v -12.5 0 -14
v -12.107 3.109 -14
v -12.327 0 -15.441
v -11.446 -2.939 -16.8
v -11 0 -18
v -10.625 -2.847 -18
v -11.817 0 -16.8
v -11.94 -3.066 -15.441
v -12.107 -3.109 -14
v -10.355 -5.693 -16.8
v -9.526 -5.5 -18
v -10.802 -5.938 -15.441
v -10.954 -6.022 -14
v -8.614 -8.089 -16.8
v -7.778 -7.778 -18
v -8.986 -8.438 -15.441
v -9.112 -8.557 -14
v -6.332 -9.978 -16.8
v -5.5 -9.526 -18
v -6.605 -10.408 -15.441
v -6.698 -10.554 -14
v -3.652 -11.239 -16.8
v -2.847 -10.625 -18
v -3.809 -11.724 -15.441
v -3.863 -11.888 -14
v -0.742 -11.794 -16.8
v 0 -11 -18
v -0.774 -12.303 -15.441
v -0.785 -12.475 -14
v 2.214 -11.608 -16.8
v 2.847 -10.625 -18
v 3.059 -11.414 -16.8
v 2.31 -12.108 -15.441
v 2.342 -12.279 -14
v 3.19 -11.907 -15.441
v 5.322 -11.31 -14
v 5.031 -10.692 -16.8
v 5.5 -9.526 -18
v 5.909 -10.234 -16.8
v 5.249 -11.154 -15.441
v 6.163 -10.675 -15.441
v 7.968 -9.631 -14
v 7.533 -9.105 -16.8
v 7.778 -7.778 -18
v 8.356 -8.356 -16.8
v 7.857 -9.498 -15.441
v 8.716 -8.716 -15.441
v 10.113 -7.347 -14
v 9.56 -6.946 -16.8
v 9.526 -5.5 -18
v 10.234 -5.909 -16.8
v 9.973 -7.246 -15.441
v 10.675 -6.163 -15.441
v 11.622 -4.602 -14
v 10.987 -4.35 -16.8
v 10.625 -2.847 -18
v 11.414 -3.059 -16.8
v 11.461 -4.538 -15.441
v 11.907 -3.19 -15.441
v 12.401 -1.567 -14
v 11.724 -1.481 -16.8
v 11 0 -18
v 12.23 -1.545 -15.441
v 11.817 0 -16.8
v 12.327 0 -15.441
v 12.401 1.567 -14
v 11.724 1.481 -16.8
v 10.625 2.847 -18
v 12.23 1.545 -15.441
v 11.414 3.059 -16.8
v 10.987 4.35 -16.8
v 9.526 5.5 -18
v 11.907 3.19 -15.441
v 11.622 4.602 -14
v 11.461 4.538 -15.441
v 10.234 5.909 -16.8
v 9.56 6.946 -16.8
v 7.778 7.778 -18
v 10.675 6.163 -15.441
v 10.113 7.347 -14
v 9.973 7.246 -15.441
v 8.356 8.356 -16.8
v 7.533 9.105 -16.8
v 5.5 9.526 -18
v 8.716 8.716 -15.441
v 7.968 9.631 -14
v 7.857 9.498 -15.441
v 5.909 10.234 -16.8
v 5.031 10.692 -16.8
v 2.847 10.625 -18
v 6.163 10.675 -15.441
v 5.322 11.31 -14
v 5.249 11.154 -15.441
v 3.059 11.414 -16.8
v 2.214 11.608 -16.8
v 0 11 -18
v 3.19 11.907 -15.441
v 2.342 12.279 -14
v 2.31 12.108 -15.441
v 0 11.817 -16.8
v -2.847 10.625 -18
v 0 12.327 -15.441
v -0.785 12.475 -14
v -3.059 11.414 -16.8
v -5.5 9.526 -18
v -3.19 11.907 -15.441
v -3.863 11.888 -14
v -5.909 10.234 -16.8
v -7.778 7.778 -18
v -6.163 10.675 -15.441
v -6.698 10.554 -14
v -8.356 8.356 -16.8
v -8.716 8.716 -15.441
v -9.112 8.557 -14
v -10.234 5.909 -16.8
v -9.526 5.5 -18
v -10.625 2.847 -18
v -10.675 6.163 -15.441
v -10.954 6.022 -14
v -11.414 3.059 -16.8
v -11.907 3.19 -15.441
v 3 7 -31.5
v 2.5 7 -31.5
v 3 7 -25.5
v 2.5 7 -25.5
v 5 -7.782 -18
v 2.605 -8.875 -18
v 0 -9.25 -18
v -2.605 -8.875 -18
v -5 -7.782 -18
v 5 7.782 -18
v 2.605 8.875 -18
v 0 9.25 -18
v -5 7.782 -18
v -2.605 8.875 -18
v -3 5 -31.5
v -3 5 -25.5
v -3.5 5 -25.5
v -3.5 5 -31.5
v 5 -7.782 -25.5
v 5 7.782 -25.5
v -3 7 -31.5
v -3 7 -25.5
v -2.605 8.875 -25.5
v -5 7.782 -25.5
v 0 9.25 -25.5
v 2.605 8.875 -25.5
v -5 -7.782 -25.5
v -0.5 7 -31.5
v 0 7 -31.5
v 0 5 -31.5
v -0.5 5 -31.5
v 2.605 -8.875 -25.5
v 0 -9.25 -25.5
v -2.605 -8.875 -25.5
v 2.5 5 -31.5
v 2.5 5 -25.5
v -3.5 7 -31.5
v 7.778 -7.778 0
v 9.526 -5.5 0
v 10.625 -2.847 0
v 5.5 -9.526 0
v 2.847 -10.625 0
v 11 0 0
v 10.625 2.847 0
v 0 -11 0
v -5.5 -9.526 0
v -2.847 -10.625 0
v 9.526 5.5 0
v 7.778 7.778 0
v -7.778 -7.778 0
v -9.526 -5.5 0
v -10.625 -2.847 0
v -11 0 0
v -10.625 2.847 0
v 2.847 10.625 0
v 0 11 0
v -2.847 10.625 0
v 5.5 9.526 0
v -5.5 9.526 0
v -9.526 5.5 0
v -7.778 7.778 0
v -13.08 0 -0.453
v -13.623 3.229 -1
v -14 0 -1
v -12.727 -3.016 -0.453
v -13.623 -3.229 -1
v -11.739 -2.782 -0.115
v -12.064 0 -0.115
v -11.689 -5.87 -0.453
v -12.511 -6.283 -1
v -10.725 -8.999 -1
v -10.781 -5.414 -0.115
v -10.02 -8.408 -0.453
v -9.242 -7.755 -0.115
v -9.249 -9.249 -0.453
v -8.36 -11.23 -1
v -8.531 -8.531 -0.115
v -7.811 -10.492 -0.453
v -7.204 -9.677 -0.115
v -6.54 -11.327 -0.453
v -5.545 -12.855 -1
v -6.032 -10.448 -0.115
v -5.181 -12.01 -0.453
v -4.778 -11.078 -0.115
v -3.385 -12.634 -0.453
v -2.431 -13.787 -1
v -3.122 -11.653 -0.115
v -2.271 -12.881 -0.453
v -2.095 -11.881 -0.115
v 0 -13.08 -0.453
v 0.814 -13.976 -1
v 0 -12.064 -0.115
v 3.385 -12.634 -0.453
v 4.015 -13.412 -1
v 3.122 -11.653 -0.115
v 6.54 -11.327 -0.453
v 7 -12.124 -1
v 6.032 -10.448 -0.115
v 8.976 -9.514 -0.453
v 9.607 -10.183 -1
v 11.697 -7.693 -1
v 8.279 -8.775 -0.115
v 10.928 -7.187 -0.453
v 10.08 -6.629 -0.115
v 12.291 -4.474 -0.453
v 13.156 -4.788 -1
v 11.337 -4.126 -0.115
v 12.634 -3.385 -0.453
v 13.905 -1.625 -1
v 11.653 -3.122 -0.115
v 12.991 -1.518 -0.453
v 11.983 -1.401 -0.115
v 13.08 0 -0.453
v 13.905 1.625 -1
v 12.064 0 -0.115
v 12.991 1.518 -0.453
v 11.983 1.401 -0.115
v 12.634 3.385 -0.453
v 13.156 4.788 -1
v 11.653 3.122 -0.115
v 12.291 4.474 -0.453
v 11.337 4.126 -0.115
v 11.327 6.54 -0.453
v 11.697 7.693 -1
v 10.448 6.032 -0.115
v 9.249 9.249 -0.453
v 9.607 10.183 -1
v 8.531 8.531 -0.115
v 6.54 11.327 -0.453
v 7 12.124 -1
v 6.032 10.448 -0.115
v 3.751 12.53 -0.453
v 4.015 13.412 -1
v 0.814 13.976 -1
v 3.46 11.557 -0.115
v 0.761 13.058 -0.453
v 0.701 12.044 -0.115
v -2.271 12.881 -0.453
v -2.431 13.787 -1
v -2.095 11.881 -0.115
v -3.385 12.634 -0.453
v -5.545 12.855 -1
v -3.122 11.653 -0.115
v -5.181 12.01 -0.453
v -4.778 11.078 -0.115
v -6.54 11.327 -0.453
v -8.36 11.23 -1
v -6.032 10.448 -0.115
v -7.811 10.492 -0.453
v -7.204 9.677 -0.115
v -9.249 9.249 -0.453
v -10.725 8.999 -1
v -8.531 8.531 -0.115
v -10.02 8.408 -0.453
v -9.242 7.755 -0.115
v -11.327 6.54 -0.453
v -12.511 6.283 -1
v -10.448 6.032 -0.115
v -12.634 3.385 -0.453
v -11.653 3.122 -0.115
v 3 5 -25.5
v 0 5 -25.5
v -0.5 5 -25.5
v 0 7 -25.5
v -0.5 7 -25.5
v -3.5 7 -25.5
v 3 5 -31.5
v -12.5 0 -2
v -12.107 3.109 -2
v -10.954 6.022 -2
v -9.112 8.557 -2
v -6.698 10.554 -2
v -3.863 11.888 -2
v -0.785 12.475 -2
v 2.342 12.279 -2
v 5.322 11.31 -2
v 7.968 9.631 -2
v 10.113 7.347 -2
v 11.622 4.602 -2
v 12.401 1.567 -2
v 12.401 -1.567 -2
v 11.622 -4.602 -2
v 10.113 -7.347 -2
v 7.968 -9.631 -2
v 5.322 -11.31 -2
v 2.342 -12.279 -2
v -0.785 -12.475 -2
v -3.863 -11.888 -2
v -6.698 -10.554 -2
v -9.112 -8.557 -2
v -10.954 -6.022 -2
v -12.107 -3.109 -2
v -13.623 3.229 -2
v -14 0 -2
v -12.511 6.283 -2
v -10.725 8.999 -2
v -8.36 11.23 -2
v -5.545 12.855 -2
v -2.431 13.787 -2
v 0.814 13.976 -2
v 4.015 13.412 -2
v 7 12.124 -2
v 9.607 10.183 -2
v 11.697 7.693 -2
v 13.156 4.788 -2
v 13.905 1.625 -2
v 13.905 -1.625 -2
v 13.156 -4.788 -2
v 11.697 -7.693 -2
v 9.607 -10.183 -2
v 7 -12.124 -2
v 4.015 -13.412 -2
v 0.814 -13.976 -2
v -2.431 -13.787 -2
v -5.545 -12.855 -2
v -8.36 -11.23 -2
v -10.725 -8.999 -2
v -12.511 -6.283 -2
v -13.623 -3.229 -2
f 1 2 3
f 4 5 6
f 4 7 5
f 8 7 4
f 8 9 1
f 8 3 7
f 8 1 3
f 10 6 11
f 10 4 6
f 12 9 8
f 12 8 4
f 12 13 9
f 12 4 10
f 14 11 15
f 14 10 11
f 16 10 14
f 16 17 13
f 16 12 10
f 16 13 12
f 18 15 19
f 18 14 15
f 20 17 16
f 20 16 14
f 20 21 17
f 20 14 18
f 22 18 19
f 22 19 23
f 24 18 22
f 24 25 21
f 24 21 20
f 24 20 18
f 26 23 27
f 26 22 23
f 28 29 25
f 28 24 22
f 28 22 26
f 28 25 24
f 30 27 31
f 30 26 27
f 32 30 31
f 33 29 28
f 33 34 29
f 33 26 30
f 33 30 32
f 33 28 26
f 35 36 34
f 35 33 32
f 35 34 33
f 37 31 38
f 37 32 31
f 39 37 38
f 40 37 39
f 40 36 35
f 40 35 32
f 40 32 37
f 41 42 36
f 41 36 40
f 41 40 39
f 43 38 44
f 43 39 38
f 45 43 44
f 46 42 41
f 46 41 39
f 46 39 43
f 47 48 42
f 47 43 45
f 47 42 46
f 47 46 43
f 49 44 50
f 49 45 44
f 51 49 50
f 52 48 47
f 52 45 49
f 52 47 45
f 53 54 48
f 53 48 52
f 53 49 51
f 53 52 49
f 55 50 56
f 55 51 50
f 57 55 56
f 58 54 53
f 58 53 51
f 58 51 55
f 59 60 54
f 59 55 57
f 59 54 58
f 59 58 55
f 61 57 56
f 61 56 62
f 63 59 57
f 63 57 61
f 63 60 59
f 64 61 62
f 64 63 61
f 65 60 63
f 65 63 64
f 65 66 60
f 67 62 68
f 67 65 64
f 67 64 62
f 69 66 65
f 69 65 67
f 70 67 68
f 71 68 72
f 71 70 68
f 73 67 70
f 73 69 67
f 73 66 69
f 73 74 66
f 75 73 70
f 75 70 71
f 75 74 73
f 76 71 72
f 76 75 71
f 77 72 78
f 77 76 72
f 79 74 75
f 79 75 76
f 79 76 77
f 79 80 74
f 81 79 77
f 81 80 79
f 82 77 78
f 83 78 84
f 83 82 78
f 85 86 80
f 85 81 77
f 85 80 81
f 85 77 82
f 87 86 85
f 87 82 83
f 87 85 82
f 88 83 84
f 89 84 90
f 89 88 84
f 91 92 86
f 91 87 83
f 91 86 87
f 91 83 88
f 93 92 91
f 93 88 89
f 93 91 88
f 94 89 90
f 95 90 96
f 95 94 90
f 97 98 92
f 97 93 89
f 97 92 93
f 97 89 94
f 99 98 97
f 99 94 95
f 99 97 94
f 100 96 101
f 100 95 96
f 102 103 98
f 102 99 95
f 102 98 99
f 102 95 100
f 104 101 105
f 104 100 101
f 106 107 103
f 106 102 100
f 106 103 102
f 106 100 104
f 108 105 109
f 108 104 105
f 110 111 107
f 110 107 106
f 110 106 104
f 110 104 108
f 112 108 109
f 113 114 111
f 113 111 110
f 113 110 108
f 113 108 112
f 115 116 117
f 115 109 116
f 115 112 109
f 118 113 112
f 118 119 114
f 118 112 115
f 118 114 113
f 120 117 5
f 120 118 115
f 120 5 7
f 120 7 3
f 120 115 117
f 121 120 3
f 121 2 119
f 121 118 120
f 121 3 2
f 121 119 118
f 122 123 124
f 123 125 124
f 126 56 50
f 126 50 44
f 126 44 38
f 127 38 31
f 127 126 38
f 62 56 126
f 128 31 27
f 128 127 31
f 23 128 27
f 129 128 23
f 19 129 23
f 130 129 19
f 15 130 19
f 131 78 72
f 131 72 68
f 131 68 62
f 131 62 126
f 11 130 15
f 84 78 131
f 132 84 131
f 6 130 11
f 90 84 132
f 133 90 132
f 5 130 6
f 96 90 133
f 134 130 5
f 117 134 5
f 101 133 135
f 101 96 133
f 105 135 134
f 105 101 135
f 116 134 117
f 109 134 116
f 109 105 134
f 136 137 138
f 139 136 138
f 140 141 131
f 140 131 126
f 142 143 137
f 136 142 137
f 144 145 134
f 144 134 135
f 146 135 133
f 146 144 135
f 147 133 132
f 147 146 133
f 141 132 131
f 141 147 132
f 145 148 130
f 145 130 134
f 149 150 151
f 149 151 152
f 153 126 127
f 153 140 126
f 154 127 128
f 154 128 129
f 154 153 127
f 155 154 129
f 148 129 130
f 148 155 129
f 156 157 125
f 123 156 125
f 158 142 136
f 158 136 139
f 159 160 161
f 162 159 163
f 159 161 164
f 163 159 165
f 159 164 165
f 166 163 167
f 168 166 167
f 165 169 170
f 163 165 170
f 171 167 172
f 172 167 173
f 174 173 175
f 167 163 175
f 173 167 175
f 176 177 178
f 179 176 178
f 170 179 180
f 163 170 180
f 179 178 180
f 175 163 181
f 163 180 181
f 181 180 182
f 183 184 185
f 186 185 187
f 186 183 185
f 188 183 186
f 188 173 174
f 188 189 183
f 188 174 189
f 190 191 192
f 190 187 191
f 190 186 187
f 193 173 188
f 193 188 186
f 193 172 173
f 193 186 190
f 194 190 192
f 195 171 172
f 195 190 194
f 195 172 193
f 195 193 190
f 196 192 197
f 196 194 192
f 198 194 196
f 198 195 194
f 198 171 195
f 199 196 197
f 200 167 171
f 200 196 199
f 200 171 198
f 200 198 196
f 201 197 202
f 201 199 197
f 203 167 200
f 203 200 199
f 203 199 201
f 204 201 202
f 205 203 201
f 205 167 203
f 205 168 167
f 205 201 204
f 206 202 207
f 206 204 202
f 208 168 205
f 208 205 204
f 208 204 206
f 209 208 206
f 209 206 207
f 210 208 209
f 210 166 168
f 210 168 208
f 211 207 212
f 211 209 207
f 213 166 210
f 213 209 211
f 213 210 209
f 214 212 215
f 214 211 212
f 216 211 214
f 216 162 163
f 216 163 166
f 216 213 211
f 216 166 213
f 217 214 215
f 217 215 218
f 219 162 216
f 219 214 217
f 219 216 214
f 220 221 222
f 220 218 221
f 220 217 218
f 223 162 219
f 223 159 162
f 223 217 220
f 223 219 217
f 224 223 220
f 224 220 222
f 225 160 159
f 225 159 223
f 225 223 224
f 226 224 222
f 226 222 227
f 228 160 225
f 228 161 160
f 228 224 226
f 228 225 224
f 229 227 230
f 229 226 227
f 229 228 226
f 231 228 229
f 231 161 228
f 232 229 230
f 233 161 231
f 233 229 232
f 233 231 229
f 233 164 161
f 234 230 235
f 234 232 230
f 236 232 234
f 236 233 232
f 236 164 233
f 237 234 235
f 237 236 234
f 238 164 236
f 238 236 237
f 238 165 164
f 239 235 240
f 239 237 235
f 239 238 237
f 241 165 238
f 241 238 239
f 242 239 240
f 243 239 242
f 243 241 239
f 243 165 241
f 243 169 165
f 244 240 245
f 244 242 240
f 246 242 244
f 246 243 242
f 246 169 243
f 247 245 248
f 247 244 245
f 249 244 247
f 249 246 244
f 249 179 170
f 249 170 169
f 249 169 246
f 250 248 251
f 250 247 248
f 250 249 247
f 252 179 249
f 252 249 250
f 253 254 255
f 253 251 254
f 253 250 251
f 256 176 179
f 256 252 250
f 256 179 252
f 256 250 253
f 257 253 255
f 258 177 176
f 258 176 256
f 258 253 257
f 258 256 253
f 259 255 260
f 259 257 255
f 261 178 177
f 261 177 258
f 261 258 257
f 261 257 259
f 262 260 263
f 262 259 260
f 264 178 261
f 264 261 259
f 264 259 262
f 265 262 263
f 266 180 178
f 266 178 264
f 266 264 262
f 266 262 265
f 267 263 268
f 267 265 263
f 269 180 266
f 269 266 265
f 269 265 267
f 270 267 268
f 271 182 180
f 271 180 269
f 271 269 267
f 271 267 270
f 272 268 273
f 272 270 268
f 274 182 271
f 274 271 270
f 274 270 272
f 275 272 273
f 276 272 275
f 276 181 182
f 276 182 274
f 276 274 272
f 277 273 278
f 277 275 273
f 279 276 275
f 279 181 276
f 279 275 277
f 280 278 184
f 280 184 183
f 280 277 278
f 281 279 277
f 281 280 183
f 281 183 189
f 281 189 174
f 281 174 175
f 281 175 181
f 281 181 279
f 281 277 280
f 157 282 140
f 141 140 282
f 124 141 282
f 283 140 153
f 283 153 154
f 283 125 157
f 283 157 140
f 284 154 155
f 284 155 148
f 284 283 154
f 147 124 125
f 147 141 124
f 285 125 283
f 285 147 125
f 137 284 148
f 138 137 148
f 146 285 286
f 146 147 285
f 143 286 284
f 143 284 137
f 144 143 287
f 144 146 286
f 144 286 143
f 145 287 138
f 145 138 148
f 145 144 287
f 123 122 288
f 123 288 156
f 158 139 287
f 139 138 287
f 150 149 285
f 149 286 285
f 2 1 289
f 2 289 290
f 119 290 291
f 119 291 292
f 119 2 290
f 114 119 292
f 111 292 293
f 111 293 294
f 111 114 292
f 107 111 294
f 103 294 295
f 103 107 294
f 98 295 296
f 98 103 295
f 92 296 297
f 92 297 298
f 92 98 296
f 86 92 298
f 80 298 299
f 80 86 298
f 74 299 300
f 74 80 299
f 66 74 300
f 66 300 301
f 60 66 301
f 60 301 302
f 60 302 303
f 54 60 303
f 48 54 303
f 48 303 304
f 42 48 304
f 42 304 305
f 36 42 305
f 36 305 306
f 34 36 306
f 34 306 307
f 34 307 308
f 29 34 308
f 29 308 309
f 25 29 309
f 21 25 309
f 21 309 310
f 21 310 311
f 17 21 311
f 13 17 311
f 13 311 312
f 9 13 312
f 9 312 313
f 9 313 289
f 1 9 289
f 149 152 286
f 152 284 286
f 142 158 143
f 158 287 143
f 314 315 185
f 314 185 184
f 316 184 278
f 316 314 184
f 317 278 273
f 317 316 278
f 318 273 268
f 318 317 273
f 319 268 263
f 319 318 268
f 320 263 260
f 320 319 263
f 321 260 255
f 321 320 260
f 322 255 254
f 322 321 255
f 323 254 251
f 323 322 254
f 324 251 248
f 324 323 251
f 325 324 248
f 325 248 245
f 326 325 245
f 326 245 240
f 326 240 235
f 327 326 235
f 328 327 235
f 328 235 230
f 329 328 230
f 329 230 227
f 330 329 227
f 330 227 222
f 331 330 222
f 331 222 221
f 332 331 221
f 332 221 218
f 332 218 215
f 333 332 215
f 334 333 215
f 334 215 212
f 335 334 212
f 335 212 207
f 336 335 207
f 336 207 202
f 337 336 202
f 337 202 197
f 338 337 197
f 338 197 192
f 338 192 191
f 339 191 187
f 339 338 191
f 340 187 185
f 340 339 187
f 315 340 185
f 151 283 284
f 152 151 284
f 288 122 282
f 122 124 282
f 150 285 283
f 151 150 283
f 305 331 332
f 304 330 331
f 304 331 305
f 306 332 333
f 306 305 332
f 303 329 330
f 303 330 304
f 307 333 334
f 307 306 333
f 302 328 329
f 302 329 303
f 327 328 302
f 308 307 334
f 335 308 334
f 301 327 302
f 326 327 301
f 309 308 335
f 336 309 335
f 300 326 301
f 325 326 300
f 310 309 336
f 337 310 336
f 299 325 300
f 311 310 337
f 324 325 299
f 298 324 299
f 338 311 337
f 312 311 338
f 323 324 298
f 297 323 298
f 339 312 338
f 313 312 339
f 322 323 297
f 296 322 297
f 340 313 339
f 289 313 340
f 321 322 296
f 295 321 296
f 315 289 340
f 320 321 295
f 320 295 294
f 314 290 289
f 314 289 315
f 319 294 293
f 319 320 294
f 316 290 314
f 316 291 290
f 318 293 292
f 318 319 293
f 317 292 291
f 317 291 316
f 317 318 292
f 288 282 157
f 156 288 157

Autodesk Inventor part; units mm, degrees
ref_plane "YZ Plane" through (0, 0, 0) normal (1, 0, 0) x (0, 1, 0)
ref_plane "XZ Plane" through (0, 0, 0) normal (0, 1, 0) x (-1, 0, 0)
ref_plane "XY Plane" through (0, 0, 0) normal (0, 0, 1) x (1, 0, 0)
sketch "Skizze1" plane through (0, 0, 0) normal (0, 1, 0) x (-1, 0, 0)
  line L0 (0, 0) -> (0, -100) construction
  line L1 (0, 0) -> (11, 0)
  arc A0 (14, -1) -> (11, 0) centre (11, -5) ccw
  line L2 (14, -1) -> (14, -2)
  line L3 (14, -2) -> (12.5, -2)
  line L4 (12.5, -2) -> (12.5, -14)
  arc A1 (11, -18) -> (12.5, -14) centre (6.4167, -14) ccw
  line L5 (11, -18) -> (9.25, -18)
  line L6 (9.25, -18) -> (9.25, -25.5)
  line L7 (9.25, -25.5) -> (0, -25.5)
  line L8 (0, 0) -> (0, -25.5)
  point P0 (13.25, -2)
  dimension "d0" = 100
  dimension "d1" = 25
  dimension "d2" = 28
  dimension "d3" = 2
  dimension "d4" = 1
  dimension "d5" = 3
  dimension "d6" = 12
  dimension "d7" = 4
  dimension "d8" = 22
  dimension "d9" = 18.5
  dimension "d10" = 7.5
revolve "Umdrehung1" add sketch "Skizze1" angle 360 about axis through (0, 0, 0) along (0, 0, -1)
thread "Gewinde1" size "M25x2" class "6g" standard "ISO Metric profile" full length
sketch "Skizze2" plane through (0, 0, -25.5) normal (0, 0, -1) x (-1, 0, 0)
  circle A0 centre (0, 0) radius 9.25 projected
  line L0 (5, 7.7822) -> (-5, 7.7822)
  line L1 (-5, 7.7822) -> (-5, -7.7822)
  line L2 (-5, -7.7822) -> (5, -7.7822)
  line L3 (5, -7.7822) -> (5, 7.7822)
  dimension "d14" = 10
extrude "Extrusion1" cut sketch "Skizze2" against normal up to surface (7.5 mm away) contours A0 L3 | L1 A0
sketch "Skizze3" plane through (0, 0, -25.5) normal (0, 0, -1) x (-1, 0, 0)
  line L0 (3.5, 7) -> (3, 7)
  line L1 (3, 7) -> (3, 5)
  line L2 (3, 5) -> (3.5, 5)
  line L3 (3.5, 5) -> (3.5, 7)
  point P0 (0, 0)
  point P1 (3, 6)
  dimension "d17" = 0.5
  dimension "d18" = 2
  dimension "d19" = 5
  dimension "d20" = 3
extrude "Extrusion2" add sketch "Skizze3" along normal blind 6
pattern_linear "Rechteckige Anordnung1" count 3 spacing 3 along (1, 0, 0) of "Extrusion2"
properties part number "Druckknopf_Konsole_groß" material "Stahl, galvanisiert"
